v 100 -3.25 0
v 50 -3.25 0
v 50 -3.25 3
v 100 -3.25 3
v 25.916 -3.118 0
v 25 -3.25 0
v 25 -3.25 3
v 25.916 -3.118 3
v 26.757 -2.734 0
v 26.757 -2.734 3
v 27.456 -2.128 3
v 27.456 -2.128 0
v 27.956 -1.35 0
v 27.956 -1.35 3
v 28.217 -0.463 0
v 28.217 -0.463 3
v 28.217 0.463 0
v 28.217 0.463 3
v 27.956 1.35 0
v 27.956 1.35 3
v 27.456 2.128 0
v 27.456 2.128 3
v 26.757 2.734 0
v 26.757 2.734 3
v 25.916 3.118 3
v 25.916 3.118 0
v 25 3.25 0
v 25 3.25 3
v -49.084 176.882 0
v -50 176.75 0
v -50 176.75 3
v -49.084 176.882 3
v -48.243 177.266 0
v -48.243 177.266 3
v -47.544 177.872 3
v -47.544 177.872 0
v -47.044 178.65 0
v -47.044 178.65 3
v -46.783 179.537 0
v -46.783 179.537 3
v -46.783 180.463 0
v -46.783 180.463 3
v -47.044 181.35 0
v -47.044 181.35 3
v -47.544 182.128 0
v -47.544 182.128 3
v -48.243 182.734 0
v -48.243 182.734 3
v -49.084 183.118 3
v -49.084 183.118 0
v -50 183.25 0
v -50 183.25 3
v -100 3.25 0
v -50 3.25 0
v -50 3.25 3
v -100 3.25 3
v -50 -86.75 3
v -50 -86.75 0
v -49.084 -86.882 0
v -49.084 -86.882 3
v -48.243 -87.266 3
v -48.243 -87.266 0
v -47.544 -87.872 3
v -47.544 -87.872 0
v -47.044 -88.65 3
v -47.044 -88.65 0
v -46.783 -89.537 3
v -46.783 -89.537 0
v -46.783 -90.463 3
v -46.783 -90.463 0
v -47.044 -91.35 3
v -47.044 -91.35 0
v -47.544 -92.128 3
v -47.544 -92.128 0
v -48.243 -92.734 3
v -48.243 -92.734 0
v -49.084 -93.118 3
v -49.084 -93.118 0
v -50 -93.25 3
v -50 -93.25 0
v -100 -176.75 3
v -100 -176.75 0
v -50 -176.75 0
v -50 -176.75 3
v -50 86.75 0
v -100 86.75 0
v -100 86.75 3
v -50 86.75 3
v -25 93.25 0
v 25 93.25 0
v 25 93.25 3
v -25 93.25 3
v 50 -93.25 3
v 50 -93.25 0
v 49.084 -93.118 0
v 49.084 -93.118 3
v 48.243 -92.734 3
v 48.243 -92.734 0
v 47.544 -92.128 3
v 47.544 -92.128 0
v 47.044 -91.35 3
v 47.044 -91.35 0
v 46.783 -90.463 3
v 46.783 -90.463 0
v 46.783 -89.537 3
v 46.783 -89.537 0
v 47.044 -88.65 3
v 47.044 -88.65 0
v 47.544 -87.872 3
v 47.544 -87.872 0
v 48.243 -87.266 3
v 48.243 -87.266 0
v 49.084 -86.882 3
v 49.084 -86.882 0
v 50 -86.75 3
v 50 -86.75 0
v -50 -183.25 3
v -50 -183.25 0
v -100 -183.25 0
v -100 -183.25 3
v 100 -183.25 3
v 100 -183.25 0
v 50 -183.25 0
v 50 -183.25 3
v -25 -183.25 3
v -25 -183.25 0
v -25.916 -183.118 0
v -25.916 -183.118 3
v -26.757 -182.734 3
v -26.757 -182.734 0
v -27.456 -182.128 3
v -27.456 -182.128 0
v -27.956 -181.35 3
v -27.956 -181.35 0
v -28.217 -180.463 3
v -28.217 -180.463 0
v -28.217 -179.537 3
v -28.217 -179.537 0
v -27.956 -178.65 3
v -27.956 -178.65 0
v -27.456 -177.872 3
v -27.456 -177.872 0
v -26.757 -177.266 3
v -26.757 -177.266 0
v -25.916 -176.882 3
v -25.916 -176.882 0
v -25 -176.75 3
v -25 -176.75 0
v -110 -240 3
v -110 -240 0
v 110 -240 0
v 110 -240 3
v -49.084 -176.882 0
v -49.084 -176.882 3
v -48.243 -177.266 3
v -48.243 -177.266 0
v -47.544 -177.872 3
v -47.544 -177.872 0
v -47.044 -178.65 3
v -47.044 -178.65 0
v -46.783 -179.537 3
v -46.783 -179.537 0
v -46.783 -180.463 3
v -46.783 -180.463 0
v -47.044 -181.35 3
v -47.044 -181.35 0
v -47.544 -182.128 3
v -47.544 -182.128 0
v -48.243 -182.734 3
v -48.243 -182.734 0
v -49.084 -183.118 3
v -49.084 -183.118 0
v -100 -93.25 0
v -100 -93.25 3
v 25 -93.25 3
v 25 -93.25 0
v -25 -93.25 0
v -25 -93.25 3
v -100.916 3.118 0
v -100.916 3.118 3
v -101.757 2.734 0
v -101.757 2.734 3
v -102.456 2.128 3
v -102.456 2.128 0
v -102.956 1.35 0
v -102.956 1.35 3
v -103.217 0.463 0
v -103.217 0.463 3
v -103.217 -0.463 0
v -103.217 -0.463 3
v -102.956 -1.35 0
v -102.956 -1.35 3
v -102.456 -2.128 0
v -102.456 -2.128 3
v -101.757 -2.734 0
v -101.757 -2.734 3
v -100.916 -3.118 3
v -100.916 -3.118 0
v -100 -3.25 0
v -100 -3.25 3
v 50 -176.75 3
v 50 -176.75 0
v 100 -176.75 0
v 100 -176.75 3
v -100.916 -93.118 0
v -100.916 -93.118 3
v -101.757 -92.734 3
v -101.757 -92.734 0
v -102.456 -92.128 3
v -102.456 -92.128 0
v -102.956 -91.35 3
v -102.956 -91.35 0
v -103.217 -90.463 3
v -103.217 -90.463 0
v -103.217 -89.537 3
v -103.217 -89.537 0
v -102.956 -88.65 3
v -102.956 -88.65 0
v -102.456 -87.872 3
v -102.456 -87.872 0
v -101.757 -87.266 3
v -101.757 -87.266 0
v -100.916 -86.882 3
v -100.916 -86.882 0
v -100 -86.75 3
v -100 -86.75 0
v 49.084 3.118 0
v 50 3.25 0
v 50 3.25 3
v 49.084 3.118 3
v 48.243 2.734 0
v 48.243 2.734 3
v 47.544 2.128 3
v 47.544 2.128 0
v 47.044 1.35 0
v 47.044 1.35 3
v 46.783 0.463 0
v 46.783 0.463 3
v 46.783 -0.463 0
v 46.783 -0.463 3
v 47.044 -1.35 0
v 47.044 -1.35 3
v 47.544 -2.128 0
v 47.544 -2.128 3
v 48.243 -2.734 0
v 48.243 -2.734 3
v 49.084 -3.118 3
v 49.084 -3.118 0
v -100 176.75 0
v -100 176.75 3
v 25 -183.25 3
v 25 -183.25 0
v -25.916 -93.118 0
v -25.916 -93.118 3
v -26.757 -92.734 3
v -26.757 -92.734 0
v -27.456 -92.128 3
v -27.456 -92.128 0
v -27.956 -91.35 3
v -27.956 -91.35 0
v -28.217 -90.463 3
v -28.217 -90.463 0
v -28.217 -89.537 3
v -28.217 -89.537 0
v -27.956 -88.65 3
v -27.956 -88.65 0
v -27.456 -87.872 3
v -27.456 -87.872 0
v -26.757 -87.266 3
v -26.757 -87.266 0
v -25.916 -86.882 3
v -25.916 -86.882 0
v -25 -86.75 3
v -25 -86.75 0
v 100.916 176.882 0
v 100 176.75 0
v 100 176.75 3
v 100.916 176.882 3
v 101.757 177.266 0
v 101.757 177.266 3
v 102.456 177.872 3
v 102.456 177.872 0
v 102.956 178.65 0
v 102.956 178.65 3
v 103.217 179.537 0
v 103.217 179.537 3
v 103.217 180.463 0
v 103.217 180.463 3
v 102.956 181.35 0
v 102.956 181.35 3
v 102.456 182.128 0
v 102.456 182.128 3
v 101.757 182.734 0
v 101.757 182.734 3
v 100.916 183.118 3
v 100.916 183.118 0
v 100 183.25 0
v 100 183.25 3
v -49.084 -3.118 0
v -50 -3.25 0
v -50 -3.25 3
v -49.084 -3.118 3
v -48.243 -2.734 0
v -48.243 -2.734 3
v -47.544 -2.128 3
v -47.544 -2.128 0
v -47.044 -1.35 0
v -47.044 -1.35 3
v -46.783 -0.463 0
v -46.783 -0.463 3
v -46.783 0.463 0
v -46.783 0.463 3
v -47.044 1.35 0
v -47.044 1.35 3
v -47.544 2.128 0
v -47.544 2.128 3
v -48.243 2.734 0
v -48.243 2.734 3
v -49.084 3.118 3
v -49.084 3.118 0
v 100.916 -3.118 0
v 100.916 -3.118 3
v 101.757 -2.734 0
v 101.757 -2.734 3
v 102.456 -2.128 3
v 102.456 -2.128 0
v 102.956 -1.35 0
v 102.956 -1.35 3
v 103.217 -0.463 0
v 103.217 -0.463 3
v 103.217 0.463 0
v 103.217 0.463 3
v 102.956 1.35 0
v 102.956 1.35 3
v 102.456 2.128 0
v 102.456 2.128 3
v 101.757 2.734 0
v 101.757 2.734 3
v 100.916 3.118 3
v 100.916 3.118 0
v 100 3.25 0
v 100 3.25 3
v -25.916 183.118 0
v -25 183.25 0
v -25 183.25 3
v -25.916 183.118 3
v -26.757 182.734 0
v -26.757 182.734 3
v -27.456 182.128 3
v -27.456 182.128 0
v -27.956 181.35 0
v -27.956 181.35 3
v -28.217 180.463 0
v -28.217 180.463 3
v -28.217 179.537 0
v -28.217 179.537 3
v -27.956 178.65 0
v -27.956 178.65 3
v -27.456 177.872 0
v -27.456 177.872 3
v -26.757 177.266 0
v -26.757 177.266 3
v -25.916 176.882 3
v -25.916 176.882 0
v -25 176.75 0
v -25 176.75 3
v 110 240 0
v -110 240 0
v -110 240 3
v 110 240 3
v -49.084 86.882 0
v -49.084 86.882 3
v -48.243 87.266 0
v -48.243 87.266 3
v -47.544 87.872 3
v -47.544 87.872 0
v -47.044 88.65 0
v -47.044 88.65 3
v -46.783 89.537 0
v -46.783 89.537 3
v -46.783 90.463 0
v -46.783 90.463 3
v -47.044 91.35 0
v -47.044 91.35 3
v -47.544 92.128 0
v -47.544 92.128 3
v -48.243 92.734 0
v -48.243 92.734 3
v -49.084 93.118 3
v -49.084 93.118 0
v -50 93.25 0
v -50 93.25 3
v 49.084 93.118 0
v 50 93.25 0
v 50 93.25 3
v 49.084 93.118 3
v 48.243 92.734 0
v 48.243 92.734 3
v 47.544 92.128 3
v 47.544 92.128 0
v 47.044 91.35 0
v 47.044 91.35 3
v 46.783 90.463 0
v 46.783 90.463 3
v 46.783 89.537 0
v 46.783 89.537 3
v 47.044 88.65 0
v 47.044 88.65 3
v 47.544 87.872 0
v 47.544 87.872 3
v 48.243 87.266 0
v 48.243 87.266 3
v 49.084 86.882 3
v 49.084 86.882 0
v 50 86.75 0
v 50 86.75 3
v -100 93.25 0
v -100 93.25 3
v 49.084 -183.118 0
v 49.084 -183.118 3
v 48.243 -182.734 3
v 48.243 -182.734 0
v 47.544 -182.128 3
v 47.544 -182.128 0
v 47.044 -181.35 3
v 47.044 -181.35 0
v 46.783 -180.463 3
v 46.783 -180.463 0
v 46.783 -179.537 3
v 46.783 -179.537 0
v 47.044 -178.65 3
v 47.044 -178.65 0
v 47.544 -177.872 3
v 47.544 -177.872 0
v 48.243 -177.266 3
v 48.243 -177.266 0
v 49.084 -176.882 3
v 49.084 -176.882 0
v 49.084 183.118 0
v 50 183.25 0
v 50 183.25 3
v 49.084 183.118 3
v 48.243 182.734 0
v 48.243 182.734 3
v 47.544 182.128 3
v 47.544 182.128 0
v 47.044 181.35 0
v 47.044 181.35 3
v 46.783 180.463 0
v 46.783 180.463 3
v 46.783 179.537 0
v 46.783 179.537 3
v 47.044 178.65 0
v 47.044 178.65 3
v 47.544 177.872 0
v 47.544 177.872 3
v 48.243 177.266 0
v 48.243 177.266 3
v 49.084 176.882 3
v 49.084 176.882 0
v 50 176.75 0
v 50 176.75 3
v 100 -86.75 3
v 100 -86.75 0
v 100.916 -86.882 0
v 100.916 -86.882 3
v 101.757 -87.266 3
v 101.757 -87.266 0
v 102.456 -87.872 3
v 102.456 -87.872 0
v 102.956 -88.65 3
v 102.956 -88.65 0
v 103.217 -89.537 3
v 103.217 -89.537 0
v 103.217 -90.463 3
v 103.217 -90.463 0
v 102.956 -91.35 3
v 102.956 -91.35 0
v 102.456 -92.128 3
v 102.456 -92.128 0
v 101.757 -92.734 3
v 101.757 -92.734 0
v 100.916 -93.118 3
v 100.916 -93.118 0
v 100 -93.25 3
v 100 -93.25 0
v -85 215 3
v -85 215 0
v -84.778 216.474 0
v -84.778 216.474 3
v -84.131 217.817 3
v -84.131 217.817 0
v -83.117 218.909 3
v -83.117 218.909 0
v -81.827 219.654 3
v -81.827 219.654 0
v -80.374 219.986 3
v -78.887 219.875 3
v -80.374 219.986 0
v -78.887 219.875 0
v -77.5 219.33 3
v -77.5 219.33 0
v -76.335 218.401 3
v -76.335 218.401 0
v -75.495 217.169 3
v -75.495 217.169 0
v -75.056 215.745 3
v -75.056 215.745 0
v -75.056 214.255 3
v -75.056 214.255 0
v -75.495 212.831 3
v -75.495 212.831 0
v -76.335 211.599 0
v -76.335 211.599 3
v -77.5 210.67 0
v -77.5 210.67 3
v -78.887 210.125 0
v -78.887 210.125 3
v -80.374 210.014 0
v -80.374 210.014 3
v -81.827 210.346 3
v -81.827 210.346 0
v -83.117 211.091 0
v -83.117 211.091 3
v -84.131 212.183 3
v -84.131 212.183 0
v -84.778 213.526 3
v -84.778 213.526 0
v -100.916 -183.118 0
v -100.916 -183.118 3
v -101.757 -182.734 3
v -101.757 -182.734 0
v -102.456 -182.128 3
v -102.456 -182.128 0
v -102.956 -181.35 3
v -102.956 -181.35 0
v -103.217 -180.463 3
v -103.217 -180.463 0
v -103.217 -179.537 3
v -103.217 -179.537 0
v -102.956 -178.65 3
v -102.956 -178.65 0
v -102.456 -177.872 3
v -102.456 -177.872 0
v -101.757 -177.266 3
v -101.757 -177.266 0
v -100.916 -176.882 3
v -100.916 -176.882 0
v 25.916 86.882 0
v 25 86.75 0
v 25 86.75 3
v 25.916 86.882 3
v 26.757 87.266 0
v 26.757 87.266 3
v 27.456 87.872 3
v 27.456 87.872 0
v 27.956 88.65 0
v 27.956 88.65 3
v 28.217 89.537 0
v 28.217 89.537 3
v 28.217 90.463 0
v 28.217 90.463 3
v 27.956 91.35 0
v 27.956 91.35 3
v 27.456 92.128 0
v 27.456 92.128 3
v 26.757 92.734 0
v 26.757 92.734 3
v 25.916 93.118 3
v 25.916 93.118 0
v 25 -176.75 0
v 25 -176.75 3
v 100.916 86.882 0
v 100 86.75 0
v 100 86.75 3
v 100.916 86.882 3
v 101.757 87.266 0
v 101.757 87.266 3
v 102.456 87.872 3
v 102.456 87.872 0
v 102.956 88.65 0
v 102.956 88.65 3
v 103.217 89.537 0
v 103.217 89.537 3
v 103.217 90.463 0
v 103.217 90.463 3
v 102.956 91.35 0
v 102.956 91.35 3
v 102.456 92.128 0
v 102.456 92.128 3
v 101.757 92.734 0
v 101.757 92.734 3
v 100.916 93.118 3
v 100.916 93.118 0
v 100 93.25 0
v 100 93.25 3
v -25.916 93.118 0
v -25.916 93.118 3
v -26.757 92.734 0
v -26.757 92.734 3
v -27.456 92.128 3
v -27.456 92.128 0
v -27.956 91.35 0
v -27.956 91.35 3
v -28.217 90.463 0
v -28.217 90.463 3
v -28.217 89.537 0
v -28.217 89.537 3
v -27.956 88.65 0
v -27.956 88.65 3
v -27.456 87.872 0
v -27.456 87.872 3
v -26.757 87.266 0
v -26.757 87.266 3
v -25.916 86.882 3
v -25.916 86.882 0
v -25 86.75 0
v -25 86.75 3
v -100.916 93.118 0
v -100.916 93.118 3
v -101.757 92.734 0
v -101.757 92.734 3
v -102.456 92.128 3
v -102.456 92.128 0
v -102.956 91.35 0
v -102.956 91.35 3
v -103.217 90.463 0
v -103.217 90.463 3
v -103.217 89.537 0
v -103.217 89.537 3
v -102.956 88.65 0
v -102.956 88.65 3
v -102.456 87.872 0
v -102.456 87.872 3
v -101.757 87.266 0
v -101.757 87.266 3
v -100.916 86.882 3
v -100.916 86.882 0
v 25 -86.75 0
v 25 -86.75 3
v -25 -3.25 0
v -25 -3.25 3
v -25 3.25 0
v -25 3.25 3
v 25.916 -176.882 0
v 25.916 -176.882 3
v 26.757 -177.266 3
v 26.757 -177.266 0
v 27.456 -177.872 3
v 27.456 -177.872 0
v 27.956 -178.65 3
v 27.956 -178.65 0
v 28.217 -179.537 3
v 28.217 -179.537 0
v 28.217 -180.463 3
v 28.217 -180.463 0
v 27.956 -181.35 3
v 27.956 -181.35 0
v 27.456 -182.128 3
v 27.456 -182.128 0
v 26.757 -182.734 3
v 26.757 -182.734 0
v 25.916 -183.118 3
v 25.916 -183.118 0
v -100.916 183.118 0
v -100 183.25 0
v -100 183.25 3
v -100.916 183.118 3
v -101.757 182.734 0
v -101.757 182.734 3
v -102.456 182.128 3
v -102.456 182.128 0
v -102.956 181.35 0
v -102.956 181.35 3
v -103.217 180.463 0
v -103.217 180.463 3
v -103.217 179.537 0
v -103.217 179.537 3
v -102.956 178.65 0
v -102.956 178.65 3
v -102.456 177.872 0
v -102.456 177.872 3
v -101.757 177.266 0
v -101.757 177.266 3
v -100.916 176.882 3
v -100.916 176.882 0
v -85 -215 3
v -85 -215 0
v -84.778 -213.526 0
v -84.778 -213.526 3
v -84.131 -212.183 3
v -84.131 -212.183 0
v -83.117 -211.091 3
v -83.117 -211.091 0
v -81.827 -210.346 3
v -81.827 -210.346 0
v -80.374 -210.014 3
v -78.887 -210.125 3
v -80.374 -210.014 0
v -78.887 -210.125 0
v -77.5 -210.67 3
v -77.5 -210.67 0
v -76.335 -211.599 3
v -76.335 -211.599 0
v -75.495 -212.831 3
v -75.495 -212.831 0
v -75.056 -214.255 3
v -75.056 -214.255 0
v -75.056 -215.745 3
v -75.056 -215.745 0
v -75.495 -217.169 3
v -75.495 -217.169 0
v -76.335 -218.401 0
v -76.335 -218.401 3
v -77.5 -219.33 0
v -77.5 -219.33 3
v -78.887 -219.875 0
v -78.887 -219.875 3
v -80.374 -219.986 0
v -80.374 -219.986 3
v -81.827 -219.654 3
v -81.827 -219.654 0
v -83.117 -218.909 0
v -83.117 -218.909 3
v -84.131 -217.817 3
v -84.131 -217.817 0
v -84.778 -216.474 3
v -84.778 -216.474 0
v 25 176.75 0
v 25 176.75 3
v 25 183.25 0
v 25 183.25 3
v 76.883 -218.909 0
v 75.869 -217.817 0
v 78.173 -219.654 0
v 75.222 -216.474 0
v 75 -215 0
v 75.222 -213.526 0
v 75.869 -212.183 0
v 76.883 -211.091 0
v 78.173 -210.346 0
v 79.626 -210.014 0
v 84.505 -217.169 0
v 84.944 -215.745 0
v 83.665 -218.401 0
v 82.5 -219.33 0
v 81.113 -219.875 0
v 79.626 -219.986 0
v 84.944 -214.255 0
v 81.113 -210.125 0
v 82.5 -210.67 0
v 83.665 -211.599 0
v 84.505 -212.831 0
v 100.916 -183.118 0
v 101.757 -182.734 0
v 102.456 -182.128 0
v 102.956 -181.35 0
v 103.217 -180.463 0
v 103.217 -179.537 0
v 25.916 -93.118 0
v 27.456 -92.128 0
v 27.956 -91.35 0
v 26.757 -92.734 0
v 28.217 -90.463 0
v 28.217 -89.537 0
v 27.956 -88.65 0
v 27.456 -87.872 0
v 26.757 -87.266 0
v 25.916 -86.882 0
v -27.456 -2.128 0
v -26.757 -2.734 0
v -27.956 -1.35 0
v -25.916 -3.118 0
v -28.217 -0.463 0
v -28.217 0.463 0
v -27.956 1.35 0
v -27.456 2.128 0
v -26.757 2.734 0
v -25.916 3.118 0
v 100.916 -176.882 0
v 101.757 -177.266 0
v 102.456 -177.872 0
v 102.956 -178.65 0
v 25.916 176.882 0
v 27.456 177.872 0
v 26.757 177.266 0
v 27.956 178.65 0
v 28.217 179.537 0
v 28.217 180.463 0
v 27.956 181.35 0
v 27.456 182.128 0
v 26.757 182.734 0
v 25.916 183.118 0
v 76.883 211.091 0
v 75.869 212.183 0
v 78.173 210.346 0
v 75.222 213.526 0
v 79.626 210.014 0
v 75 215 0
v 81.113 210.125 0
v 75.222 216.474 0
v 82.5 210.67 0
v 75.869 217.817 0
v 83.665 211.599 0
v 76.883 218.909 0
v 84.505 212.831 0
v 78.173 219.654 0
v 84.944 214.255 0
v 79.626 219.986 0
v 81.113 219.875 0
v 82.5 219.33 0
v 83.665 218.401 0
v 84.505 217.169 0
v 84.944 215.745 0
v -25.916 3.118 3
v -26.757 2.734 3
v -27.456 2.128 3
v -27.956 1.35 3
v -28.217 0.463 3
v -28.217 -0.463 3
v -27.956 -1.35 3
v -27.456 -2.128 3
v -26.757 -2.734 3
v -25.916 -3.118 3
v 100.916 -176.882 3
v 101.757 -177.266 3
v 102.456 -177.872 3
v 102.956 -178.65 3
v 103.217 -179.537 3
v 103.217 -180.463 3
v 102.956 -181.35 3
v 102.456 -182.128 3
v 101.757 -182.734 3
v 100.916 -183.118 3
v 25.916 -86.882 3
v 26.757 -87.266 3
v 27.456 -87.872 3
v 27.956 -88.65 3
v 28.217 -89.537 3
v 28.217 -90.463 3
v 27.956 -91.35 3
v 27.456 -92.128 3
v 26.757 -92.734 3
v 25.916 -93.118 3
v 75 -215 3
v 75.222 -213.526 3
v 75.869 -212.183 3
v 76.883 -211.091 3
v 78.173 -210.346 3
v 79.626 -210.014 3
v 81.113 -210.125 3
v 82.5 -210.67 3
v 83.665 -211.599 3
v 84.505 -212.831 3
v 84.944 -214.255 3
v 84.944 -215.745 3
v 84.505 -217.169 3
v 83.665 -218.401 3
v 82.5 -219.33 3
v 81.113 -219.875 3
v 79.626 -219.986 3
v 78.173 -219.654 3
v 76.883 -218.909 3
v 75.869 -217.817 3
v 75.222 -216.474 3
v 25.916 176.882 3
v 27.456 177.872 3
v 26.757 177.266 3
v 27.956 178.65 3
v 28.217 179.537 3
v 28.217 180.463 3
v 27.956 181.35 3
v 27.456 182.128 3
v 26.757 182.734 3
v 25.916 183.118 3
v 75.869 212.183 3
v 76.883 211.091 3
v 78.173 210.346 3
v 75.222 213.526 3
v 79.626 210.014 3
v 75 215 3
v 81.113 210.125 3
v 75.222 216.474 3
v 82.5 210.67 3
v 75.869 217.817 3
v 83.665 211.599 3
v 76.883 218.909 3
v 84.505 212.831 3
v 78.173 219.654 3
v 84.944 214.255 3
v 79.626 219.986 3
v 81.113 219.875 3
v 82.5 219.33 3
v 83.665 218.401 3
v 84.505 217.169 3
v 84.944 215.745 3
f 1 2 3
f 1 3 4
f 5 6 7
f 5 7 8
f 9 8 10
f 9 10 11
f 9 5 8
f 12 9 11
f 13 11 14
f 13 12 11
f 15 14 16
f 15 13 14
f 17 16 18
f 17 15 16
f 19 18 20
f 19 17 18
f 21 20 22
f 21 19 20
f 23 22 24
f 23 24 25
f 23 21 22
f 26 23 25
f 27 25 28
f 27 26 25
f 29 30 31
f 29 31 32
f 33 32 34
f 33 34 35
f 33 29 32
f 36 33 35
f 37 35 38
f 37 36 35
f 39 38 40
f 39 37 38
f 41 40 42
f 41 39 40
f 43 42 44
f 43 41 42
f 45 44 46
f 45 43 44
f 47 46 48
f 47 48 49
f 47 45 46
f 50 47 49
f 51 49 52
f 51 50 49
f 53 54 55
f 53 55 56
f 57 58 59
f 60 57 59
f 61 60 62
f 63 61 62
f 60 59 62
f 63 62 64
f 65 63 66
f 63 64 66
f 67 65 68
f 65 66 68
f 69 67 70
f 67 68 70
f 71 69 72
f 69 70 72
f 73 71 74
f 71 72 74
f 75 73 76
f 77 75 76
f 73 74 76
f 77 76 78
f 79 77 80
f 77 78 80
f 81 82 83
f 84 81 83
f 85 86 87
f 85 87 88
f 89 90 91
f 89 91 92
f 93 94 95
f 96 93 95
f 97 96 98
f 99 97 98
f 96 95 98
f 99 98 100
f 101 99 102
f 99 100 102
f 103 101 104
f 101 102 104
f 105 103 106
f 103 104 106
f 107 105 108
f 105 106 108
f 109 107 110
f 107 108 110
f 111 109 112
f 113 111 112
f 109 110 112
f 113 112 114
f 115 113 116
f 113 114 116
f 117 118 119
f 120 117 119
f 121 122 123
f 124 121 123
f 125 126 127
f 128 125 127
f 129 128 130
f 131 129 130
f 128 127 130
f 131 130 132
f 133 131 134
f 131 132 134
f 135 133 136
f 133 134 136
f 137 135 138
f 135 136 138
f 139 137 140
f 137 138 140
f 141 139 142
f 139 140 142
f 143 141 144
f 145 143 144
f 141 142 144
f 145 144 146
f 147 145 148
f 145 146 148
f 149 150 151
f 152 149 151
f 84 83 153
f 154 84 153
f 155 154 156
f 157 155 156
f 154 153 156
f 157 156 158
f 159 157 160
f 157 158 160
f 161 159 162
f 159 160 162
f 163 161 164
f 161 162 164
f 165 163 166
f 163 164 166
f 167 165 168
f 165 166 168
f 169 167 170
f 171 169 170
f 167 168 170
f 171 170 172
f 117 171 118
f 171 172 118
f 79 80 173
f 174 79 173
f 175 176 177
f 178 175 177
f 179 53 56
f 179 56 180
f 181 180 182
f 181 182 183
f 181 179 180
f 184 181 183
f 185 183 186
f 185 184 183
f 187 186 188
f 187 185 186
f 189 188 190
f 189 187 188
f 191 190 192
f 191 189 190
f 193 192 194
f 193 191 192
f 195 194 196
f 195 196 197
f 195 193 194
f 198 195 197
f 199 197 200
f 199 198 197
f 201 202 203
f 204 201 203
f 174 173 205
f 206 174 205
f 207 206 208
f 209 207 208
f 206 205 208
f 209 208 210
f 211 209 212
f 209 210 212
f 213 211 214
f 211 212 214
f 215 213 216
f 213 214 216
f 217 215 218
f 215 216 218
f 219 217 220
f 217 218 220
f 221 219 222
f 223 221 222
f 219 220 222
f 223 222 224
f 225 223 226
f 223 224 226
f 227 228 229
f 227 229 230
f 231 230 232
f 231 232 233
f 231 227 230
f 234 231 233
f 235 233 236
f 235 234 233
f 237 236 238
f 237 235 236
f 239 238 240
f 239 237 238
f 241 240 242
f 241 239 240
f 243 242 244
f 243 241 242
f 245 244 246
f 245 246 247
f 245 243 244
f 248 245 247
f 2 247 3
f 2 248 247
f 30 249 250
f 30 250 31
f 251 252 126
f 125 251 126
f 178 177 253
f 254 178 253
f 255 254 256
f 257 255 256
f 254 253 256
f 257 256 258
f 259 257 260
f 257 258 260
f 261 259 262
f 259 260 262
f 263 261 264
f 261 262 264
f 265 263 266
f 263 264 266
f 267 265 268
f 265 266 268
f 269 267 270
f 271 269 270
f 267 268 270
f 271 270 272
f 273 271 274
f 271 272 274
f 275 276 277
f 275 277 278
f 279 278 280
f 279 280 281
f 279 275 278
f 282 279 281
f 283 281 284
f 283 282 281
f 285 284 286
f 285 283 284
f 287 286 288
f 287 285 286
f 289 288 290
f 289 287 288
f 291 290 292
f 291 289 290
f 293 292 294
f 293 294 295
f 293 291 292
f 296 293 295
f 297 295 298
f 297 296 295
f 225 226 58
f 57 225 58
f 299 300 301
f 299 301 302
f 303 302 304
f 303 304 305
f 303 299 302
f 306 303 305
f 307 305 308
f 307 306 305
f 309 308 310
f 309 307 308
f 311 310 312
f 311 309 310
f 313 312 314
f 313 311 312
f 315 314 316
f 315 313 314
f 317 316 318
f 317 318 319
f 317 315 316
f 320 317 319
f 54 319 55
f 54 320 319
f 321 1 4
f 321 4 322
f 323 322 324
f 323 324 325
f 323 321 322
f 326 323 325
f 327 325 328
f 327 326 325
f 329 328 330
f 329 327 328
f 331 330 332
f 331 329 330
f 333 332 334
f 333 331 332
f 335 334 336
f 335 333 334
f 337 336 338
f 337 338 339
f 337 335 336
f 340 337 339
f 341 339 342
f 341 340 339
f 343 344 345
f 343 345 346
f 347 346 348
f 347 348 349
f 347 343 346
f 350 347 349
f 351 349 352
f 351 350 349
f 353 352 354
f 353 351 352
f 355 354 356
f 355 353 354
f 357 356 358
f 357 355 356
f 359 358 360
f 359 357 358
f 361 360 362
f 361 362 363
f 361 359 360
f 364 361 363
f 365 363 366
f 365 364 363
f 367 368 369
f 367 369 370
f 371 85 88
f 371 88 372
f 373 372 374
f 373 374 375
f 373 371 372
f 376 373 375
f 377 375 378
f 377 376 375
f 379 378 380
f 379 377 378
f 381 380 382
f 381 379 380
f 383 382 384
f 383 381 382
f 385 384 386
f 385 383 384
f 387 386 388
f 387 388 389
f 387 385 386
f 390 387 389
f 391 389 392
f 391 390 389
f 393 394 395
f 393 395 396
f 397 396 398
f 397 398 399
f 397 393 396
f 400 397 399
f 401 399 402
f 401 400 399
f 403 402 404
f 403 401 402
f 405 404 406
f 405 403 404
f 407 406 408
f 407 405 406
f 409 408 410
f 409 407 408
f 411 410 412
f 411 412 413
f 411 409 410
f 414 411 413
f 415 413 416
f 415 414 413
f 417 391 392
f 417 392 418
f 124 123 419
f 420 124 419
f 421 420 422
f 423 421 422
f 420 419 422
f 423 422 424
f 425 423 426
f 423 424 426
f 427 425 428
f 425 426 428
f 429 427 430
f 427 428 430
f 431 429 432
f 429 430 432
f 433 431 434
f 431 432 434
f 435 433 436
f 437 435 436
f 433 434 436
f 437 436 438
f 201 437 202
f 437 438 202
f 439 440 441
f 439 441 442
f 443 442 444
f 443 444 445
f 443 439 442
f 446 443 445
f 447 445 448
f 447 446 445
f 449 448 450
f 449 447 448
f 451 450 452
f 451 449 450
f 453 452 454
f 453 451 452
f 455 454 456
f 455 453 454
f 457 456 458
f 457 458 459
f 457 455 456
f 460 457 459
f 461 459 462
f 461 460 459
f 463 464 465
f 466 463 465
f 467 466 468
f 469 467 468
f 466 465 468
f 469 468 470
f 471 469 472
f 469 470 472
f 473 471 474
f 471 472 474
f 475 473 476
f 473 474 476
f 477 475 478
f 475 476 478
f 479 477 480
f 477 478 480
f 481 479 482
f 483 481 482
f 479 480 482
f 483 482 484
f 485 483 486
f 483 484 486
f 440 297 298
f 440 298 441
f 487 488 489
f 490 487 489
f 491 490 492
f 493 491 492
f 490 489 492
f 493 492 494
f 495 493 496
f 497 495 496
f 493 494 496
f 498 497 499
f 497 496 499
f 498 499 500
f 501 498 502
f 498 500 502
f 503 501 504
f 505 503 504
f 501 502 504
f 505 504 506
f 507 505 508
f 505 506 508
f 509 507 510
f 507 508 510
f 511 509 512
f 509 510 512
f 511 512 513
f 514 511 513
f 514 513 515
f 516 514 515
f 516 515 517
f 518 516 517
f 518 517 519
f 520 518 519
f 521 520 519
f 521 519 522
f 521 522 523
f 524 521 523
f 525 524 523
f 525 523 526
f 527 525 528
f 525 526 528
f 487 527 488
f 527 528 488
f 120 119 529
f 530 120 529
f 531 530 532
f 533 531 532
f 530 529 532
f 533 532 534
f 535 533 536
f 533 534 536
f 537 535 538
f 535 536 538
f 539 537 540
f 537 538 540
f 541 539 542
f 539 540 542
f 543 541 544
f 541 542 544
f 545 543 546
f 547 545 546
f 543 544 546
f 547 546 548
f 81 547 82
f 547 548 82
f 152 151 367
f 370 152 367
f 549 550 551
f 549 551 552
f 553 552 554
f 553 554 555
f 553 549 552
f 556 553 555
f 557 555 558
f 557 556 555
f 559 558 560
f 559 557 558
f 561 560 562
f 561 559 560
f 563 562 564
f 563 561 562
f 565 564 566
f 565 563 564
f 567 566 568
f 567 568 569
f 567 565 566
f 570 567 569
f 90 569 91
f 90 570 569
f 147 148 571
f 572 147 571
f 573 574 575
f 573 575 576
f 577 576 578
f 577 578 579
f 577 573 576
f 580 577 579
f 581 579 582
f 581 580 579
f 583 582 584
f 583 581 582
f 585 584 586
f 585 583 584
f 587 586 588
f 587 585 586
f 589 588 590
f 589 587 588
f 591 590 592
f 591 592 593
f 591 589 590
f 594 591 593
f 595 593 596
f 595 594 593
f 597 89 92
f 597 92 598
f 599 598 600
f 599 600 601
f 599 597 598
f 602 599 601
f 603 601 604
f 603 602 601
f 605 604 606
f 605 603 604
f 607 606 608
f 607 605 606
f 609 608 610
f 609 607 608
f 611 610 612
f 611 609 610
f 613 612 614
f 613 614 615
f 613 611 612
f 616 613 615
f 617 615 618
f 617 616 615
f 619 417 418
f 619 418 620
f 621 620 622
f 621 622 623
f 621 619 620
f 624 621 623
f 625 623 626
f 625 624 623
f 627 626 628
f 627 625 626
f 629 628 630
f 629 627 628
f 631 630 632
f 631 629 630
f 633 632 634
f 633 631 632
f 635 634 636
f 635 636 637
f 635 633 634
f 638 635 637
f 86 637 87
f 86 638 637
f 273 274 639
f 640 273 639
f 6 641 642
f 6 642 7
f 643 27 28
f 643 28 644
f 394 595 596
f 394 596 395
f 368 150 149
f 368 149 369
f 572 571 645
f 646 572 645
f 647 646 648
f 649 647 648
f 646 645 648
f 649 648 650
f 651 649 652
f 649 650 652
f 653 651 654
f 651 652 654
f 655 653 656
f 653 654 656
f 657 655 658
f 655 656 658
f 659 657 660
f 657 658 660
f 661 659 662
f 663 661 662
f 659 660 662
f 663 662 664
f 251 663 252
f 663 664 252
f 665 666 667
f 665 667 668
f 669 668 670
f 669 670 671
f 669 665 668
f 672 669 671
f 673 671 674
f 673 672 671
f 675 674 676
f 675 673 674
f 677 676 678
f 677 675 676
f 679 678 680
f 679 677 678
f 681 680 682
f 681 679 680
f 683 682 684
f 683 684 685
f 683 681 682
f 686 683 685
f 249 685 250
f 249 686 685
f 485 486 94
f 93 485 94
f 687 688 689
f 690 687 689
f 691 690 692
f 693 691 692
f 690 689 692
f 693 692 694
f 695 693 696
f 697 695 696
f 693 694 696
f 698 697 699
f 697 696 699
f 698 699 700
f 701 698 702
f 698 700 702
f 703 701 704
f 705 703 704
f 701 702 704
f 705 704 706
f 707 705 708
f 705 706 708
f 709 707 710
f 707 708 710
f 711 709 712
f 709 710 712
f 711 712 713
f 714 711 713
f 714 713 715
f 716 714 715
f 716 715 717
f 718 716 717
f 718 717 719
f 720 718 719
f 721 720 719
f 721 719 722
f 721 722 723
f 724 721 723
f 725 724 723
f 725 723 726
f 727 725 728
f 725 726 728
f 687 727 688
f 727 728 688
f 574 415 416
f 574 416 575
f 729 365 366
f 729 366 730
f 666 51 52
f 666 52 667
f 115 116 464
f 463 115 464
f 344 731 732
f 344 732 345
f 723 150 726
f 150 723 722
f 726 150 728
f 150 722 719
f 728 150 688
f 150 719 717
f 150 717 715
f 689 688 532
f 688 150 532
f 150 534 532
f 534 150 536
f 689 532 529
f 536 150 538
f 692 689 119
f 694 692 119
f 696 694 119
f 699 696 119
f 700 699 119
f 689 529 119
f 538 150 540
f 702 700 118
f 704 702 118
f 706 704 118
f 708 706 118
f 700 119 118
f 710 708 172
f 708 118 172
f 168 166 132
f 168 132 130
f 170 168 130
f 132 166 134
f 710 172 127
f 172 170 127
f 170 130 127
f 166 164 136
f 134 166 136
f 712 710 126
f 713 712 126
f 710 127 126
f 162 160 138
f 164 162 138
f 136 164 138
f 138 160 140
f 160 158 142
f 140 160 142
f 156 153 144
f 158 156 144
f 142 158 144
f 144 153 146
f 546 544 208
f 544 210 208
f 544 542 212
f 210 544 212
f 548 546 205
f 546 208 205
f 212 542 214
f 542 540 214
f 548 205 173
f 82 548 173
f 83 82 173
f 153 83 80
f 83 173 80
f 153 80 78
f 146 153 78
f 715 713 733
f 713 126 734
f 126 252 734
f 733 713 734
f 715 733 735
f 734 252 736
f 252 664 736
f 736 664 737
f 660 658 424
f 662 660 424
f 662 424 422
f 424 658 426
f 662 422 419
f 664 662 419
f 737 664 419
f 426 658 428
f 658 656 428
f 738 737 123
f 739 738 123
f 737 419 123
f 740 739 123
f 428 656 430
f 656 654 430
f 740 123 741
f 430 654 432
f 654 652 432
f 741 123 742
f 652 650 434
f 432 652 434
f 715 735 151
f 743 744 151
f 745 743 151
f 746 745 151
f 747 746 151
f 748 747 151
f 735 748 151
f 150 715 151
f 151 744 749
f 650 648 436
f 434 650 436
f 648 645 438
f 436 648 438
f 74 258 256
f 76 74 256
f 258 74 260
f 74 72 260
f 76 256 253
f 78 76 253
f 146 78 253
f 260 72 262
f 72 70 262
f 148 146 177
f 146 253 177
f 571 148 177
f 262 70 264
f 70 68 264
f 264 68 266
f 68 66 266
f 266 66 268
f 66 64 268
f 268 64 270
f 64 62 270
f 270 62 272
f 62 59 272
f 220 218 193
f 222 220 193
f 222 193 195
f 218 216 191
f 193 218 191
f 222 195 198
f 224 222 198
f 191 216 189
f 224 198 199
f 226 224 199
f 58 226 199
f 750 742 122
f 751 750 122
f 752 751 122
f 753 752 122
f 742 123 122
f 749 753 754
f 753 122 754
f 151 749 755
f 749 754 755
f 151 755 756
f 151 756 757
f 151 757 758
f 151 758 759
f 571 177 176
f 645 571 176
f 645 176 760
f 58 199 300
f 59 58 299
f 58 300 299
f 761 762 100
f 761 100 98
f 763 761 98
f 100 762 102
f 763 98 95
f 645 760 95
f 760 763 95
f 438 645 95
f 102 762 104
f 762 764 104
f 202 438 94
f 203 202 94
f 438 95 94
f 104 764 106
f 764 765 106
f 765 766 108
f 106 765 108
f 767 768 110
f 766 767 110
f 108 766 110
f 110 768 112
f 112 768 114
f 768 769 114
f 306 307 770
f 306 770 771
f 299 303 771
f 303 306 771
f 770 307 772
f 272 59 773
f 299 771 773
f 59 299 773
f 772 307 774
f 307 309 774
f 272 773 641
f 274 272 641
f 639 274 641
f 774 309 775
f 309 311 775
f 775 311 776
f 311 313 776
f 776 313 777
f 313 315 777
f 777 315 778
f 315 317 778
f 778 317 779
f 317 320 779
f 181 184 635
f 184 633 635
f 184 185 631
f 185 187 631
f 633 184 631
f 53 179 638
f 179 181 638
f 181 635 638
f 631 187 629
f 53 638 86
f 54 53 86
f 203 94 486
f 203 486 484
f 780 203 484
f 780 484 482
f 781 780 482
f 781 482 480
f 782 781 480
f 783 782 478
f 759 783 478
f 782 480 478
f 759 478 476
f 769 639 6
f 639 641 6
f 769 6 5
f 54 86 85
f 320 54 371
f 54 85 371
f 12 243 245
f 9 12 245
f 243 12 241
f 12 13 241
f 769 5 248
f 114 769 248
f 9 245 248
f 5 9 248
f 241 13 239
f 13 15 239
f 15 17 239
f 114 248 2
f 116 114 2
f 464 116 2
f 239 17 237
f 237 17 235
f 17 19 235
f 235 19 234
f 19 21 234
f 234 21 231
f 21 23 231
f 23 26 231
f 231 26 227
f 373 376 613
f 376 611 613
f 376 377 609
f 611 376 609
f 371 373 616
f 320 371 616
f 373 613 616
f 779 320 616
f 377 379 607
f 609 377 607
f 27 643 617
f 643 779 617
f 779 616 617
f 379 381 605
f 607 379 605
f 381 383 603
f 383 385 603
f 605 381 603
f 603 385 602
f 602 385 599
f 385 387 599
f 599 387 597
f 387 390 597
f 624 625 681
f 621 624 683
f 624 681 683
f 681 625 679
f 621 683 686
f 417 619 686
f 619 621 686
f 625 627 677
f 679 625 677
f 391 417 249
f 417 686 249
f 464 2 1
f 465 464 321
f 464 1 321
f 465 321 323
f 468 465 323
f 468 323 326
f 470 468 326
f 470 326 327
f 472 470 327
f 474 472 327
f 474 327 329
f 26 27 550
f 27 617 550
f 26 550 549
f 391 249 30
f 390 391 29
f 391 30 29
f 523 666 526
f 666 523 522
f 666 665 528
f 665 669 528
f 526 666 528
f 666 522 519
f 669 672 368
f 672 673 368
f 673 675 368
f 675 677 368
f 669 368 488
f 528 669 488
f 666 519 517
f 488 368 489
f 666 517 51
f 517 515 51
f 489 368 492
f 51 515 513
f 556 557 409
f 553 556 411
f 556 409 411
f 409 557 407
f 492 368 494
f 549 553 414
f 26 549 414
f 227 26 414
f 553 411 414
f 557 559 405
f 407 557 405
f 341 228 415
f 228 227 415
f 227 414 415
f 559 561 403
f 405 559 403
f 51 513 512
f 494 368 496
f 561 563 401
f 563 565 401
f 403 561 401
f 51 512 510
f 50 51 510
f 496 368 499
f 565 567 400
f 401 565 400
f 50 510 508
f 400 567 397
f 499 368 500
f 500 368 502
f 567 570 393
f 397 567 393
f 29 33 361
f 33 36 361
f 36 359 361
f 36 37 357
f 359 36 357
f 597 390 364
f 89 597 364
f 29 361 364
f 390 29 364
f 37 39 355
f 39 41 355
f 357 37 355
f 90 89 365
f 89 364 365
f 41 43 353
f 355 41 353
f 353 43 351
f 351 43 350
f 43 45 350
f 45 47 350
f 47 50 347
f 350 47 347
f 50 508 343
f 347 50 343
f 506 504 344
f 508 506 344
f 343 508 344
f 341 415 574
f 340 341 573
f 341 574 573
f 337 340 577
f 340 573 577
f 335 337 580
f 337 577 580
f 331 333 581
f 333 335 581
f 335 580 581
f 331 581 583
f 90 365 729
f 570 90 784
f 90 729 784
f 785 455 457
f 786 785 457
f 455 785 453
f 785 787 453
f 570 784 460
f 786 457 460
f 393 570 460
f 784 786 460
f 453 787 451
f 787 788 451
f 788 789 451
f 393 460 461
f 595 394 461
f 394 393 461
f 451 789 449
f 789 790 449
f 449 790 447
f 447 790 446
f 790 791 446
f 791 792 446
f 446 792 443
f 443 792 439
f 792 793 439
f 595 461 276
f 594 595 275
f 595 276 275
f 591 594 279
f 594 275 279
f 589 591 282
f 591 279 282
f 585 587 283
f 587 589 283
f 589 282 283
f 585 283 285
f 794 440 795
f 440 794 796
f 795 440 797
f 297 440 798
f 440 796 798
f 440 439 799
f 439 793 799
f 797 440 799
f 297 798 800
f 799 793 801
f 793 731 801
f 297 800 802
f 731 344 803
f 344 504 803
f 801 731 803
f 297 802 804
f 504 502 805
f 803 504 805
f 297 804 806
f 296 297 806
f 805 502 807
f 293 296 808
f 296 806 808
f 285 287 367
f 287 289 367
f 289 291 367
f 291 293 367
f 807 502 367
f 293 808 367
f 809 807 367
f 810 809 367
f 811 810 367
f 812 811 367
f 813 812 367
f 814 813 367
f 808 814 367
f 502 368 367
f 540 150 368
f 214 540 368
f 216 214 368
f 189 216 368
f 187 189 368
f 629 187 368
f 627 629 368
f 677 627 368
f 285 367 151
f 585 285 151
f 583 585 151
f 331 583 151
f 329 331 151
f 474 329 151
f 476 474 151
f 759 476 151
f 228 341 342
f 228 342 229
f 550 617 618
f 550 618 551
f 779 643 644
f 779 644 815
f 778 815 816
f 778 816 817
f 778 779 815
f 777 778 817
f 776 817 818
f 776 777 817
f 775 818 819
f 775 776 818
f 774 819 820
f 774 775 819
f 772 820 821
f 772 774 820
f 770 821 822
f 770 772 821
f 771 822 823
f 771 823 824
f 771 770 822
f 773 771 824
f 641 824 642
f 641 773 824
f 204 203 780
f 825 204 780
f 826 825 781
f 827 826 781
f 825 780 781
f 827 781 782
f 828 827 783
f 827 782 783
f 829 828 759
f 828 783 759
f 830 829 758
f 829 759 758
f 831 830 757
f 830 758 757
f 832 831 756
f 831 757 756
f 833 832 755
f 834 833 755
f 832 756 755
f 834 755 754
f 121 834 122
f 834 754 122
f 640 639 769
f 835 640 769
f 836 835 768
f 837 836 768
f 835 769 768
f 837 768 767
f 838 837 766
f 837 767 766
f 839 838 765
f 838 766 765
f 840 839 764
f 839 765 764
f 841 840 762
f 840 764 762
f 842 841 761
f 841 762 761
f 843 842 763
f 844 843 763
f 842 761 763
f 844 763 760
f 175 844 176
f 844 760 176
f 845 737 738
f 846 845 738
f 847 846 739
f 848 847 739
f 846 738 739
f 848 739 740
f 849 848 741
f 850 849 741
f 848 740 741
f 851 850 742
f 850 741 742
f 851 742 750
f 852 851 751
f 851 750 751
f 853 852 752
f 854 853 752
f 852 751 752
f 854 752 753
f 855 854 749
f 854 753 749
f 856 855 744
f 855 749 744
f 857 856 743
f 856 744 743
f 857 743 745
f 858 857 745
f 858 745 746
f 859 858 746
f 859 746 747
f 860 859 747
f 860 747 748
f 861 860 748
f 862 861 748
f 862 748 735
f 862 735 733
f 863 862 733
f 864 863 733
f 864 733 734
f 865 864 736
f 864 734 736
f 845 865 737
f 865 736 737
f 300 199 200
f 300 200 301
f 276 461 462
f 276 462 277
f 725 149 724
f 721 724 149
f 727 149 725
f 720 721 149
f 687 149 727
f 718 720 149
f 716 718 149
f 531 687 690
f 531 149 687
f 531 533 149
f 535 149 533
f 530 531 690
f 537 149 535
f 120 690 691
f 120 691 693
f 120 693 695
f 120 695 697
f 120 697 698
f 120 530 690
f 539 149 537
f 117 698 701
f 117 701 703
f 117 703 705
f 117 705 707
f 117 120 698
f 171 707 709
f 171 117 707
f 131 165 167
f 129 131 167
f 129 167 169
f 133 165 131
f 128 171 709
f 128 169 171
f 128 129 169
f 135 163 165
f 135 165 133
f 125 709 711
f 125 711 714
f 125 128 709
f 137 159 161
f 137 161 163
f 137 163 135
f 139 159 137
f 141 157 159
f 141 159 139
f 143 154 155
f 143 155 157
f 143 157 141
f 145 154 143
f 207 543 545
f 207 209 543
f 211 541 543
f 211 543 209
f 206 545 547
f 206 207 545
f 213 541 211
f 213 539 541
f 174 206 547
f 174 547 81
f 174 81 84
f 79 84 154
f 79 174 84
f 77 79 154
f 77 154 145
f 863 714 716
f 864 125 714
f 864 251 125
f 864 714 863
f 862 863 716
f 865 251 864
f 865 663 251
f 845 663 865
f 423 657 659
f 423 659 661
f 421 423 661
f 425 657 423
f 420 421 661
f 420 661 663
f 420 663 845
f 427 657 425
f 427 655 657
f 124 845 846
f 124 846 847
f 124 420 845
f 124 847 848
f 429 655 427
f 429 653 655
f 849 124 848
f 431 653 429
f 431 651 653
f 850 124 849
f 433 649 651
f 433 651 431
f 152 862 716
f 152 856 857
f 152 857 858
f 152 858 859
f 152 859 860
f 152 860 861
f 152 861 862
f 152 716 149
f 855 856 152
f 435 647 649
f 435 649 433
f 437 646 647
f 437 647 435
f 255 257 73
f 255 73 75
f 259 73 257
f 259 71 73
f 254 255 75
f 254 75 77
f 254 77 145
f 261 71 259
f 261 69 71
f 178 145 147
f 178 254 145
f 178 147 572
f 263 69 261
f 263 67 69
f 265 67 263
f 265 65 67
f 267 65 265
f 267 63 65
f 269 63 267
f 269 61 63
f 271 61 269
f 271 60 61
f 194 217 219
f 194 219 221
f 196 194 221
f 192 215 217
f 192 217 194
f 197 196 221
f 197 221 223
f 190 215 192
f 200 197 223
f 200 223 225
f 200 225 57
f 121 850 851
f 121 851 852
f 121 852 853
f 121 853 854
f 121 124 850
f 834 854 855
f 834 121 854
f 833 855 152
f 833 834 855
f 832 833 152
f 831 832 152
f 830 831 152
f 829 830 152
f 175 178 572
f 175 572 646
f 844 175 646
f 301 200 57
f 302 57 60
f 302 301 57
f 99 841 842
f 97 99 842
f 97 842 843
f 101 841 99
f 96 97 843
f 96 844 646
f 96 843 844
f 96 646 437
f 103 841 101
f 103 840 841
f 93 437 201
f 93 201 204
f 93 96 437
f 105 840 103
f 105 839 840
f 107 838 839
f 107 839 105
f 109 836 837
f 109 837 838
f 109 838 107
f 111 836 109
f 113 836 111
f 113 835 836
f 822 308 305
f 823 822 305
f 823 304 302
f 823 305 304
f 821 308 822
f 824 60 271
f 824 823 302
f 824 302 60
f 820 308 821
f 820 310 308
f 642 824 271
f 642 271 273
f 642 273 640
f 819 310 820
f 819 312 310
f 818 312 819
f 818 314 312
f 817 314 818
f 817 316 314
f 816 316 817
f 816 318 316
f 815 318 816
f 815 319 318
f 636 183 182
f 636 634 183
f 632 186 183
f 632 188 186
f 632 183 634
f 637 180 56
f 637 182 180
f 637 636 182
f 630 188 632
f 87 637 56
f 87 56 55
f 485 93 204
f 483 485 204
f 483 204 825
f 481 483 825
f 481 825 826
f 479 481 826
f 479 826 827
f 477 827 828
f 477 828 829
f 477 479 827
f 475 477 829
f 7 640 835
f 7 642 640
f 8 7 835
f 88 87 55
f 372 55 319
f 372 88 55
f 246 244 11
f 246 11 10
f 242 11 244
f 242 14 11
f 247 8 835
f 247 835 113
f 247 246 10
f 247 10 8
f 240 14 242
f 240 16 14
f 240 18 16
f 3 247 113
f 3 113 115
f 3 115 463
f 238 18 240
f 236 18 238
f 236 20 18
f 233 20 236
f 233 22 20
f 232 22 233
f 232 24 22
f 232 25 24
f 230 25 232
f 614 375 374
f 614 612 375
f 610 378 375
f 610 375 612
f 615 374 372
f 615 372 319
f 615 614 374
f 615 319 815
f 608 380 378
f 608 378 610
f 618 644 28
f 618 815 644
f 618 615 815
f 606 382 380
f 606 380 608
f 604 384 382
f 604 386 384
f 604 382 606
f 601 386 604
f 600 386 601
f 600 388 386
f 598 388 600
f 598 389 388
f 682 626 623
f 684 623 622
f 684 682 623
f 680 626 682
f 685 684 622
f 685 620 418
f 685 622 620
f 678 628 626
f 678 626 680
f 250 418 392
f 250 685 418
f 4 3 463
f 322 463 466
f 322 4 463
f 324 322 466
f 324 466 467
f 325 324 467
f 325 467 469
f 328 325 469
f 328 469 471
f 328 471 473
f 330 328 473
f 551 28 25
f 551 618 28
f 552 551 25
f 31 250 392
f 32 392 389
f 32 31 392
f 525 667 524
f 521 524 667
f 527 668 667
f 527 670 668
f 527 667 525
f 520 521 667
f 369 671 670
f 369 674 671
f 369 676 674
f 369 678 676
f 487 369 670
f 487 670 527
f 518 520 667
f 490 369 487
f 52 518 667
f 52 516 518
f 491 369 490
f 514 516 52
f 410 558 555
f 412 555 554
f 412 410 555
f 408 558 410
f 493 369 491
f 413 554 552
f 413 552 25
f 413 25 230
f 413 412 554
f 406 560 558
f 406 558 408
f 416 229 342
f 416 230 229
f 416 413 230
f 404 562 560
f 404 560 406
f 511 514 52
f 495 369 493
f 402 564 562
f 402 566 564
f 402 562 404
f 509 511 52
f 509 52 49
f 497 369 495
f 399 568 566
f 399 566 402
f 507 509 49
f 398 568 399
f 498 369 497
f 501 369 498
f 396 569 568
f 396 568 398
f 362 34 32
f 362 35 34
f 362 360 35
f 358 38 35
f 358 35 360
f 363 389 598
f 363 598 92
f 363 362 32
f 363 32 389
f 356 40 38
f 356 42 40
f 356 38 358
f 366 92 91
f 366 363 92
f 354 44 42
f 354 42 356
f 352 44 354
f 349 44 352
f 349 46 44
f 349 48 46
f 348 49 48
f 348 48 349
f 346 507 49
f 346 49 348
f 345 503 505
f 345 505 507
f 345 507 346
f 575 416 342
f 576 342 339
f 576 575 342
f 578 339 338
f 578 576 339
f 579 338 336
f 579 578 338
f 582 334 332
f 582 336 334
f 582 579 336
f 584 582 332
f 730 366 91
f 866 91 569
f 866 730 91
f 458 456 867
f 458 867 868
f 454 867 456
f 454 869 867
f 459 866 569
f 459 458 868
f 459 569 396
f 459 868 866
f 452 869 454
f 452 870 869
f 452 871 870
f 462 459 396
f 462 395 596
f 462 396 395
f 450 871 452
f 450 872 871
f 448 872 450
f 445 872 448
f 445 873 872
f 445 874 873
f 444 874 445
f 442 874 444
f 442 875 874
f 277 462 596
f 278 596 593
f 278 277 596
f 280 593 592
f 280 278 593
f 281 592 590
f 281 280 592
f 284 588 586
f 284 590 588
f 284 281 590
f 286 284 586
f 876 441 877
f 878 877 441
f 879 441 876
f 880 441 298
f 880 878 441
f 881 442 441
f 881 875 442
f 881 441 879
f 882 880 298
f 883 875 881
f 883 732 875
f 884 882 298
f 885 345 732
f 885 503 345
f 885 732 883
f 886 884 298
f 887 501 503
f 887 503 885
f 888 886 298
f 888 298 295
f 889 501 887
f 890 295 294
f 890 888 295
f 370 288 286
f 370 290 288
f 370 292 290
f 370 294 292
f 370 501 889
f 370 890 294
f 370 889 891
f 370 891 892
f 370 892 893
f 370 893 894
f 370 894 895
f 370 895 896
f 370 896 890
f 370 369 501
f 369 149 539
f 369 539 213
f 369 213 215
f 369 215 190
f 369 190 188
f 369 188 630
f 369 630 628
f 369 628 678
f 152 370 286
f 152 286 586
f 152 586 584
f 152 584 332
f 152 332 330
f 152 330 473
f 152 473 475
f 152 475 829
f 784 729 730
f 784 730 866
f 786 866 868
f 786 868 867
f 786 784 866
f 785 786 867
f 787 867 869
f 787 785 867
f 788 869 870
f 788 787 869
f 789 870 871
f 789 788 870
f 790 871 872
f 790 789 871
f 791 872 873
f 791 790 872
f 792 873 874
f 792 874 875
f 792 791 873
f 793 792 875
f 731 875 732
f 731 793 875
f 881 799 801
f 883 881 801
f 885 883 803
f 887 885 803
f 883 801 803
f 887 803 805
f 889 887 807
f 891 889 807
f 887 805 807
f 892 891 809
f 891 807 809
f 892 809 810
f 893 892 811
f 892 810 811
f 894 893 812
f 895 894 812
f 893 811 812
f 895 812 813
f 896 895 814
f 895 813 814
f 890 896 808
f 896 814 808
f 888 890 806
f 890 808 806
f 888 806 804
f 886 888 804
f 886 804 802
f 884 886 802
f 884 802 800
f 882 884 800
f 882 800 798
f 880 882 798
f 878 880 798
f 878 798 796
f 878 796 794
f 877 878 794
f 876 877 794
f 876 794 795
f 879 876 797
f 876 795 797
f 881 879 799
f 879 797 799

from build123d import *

# Parameters (mm, degrees)
CROQUIS1_W              = 220
CROQUIS1_H              = 480
SALIENTE_EXTRUIR1_DEPTH = 3
CROQUIS2_R              = 5
CORTAR_EXTRUIR1_DEPTH   = 3


with BuildPart() as part:
    # Croquis1 → Saliente-Extruir1 (new body)
    with BuildSketch(Plane.XY):
        Rectangle(CROQUIS1_W, CROQUIS1_H)
    extrude(amount=SALIENTE_EXTRUIR1_DEPTH)

    # Croquis2 → Cortar-Extruir1 (cut)
    with BuildSketch(Plane(origin=(0, 0, 0), x_dir=(-1, 0, 0), z_dir=(0, 0, -1))):
        with Locations((-80, 215)):
            Circle(CROQUIS2_R)
        with Locations((80, 215)):
            Circle(CROQUIS2_R)
        with Locations((80, -215)):
            Circle(CROQUIS2_R)
        with Locations((-80, -215)):
            Circle(CROQUIS2_R)
        with BuildLine():
            Line((-100, 3.25), (-50, 3.25))
            ThreePointArc((-50, 3.25), (-46.75, 0), (-50, -3.25))
            Line((-50, -3.25), (-100, -3.25))
            ThreePointArc((-100, -3.25), (-103.25, 0), (-100, 3.25))
        make_face()
        with BuildLine():
            Line((-100, 93.25), (-50, 93.25))
            ThreePointArc((-50, 93.25), (-46.75, 90), (-50, 86.75))
            Line((-50, 86.75), (-100, 86.75))
            ThreePointArc((-100, 86.75), (-103.25, 90), (-100, 93.25))
        make_face()
        with BuildLine():
            Line((-100, -93.25), (-50, -93.25))
            ThreePointArc((-50, -93.25), (-46.75, -90), (-50, -86.75))
            Line((-50, -86.75), (-100, -86.75))
            ThreePointArc((-100, -86.75), (-103.25, -90), (-100, -93.25))
        make_face()
        with BuildLine():
            Line((-25, 3.25), (25, 3.25))
            ThreePointArc((25, 3.25), (28.25, 0), (25, -3.25))
            Line((25, -3.25), (-25, -3.25))
            ThreePointArc((-25, -3.25), (-28.25, 0), (-25, 3.25))
        make_face()
        with BuildLine():
            Line((-25, 93.25), (25, 93.25))
            ThreePointArc((25, 93.25), (28.25, 90), (25, 86.75))
            Line((25, 86.75), (-25, 86.75))
            ThreePointArc((-25, 86.75), (-28.25, 90), (-25, 93.25))
        make_face()
        with BuildLine():
            Line((-25, -93.25), (25, -93.25))
            ThreePointArc((25, -93.25), (28.25, -90), (25, -86.75))
            Line((25, -86.75), (-25, -86.75))
            ThreePointArc((-25, -86.75), (-28.25, -90), (-25, -93.25))
        make_face()
        with BuildLine():
            Line((50, 3.25), (100, 3.25))
            ThreePointArc((100, 3.25), (103.25, 0), (100, -3.25))
            Line((100, -3.25), (50, -3.25))
            ThreePointArc((50, -3.25), (46.75, 0), (50, 3.25))
        make_face()
        with BuildLine():
            Line((50, 93.25), (100, 93.25))
            ThreePointArc((100, 93.25), (103.25, 90), (100, 86.75))
            Line((100, 86.75), (50, 86.75))
            ThreePointArc((50, 86.75), (46.75, 90), (50, 93.25))
        make_face()
        with BuildLine():
            Line((50, -93.25), (100, -93.25))
            ThreePointArc((100, -93.25), (103.25, -90), (100, -86.75))
            Line((100, -86.75), (50, -86.75))
            ThreePointArc((50, -86.75), (46.75, -90), (50, -93.25))
        make_face()
        with BuildLine():
            Line((-100, 183.25), (-50, 183.25))
            ThreePointArc((-50, 183.25), (-46.75, 180), (-50, 176.75))
            Line((-50, 176.75), (-100, 176.75))
            ThreePointArc((-100, 176.75), (-103.25, 180), (-100, 183.25))
        make_face()
        with BuildLine():
            Line((-25, 183.25), (25, 183.25))
            ThreePointArc((25, 183.25), (28.25, 180), (25, 176.75))
            Line((25, 176.75), (-25, 176.75))
            ThreePointArc((-25, 176.75), (-28.25, 180), (-25, 183.25))
        make_face()
        with BuildLine():
            Line((50, 183.25), (100, 183.25))
            ThreePointArc((100, 183.25), (103.25, 180), (100, 176.75))
            Line((100, 176.75), (50, 176.75))
            ThreePointArc((50, 176.75), (46.75, 180), (50, 183.25))
        make_face()
        with BuildLine():
            Line((-100, -183.25), (-50, -183.25))
            ThreePointArc((-50, -183.25), (-46.75, -180), (-50, -176.75))
            Line((-50, -176.75), (-100, -176.75))
            ThreePointArc((-100, -176.75), (-103.25, -180), (-100, -183.25))
        make_face()
        with BuildLine():
            Line((-25, -183.25), (25, -183.25))
            ThreePointArc((25, -183.25), (28.25, -180), (25, -176.75))
            Line((25, -176.75), (-25, -176.75))
            ThreePointArc((-25, -176.75), (-28.25, -180), (-25, -183.25))
        make_face()
        with BuildLine():
            Line((50, -183.25), (100, -183.25))
            ThreePointArc((100, -183.25), (103.25, -180), (100, -176.75))
            Line((100, -176.75), (50, -176.75))
            ThreePointArc((50, -176.75), (46.75, -180), (50, -183.25))
        make_face()
    extrude(amount=-CORTAR_EXTRUIR1_DEPTH, mode=Mode.SUBTRACT)


solid = part.part
